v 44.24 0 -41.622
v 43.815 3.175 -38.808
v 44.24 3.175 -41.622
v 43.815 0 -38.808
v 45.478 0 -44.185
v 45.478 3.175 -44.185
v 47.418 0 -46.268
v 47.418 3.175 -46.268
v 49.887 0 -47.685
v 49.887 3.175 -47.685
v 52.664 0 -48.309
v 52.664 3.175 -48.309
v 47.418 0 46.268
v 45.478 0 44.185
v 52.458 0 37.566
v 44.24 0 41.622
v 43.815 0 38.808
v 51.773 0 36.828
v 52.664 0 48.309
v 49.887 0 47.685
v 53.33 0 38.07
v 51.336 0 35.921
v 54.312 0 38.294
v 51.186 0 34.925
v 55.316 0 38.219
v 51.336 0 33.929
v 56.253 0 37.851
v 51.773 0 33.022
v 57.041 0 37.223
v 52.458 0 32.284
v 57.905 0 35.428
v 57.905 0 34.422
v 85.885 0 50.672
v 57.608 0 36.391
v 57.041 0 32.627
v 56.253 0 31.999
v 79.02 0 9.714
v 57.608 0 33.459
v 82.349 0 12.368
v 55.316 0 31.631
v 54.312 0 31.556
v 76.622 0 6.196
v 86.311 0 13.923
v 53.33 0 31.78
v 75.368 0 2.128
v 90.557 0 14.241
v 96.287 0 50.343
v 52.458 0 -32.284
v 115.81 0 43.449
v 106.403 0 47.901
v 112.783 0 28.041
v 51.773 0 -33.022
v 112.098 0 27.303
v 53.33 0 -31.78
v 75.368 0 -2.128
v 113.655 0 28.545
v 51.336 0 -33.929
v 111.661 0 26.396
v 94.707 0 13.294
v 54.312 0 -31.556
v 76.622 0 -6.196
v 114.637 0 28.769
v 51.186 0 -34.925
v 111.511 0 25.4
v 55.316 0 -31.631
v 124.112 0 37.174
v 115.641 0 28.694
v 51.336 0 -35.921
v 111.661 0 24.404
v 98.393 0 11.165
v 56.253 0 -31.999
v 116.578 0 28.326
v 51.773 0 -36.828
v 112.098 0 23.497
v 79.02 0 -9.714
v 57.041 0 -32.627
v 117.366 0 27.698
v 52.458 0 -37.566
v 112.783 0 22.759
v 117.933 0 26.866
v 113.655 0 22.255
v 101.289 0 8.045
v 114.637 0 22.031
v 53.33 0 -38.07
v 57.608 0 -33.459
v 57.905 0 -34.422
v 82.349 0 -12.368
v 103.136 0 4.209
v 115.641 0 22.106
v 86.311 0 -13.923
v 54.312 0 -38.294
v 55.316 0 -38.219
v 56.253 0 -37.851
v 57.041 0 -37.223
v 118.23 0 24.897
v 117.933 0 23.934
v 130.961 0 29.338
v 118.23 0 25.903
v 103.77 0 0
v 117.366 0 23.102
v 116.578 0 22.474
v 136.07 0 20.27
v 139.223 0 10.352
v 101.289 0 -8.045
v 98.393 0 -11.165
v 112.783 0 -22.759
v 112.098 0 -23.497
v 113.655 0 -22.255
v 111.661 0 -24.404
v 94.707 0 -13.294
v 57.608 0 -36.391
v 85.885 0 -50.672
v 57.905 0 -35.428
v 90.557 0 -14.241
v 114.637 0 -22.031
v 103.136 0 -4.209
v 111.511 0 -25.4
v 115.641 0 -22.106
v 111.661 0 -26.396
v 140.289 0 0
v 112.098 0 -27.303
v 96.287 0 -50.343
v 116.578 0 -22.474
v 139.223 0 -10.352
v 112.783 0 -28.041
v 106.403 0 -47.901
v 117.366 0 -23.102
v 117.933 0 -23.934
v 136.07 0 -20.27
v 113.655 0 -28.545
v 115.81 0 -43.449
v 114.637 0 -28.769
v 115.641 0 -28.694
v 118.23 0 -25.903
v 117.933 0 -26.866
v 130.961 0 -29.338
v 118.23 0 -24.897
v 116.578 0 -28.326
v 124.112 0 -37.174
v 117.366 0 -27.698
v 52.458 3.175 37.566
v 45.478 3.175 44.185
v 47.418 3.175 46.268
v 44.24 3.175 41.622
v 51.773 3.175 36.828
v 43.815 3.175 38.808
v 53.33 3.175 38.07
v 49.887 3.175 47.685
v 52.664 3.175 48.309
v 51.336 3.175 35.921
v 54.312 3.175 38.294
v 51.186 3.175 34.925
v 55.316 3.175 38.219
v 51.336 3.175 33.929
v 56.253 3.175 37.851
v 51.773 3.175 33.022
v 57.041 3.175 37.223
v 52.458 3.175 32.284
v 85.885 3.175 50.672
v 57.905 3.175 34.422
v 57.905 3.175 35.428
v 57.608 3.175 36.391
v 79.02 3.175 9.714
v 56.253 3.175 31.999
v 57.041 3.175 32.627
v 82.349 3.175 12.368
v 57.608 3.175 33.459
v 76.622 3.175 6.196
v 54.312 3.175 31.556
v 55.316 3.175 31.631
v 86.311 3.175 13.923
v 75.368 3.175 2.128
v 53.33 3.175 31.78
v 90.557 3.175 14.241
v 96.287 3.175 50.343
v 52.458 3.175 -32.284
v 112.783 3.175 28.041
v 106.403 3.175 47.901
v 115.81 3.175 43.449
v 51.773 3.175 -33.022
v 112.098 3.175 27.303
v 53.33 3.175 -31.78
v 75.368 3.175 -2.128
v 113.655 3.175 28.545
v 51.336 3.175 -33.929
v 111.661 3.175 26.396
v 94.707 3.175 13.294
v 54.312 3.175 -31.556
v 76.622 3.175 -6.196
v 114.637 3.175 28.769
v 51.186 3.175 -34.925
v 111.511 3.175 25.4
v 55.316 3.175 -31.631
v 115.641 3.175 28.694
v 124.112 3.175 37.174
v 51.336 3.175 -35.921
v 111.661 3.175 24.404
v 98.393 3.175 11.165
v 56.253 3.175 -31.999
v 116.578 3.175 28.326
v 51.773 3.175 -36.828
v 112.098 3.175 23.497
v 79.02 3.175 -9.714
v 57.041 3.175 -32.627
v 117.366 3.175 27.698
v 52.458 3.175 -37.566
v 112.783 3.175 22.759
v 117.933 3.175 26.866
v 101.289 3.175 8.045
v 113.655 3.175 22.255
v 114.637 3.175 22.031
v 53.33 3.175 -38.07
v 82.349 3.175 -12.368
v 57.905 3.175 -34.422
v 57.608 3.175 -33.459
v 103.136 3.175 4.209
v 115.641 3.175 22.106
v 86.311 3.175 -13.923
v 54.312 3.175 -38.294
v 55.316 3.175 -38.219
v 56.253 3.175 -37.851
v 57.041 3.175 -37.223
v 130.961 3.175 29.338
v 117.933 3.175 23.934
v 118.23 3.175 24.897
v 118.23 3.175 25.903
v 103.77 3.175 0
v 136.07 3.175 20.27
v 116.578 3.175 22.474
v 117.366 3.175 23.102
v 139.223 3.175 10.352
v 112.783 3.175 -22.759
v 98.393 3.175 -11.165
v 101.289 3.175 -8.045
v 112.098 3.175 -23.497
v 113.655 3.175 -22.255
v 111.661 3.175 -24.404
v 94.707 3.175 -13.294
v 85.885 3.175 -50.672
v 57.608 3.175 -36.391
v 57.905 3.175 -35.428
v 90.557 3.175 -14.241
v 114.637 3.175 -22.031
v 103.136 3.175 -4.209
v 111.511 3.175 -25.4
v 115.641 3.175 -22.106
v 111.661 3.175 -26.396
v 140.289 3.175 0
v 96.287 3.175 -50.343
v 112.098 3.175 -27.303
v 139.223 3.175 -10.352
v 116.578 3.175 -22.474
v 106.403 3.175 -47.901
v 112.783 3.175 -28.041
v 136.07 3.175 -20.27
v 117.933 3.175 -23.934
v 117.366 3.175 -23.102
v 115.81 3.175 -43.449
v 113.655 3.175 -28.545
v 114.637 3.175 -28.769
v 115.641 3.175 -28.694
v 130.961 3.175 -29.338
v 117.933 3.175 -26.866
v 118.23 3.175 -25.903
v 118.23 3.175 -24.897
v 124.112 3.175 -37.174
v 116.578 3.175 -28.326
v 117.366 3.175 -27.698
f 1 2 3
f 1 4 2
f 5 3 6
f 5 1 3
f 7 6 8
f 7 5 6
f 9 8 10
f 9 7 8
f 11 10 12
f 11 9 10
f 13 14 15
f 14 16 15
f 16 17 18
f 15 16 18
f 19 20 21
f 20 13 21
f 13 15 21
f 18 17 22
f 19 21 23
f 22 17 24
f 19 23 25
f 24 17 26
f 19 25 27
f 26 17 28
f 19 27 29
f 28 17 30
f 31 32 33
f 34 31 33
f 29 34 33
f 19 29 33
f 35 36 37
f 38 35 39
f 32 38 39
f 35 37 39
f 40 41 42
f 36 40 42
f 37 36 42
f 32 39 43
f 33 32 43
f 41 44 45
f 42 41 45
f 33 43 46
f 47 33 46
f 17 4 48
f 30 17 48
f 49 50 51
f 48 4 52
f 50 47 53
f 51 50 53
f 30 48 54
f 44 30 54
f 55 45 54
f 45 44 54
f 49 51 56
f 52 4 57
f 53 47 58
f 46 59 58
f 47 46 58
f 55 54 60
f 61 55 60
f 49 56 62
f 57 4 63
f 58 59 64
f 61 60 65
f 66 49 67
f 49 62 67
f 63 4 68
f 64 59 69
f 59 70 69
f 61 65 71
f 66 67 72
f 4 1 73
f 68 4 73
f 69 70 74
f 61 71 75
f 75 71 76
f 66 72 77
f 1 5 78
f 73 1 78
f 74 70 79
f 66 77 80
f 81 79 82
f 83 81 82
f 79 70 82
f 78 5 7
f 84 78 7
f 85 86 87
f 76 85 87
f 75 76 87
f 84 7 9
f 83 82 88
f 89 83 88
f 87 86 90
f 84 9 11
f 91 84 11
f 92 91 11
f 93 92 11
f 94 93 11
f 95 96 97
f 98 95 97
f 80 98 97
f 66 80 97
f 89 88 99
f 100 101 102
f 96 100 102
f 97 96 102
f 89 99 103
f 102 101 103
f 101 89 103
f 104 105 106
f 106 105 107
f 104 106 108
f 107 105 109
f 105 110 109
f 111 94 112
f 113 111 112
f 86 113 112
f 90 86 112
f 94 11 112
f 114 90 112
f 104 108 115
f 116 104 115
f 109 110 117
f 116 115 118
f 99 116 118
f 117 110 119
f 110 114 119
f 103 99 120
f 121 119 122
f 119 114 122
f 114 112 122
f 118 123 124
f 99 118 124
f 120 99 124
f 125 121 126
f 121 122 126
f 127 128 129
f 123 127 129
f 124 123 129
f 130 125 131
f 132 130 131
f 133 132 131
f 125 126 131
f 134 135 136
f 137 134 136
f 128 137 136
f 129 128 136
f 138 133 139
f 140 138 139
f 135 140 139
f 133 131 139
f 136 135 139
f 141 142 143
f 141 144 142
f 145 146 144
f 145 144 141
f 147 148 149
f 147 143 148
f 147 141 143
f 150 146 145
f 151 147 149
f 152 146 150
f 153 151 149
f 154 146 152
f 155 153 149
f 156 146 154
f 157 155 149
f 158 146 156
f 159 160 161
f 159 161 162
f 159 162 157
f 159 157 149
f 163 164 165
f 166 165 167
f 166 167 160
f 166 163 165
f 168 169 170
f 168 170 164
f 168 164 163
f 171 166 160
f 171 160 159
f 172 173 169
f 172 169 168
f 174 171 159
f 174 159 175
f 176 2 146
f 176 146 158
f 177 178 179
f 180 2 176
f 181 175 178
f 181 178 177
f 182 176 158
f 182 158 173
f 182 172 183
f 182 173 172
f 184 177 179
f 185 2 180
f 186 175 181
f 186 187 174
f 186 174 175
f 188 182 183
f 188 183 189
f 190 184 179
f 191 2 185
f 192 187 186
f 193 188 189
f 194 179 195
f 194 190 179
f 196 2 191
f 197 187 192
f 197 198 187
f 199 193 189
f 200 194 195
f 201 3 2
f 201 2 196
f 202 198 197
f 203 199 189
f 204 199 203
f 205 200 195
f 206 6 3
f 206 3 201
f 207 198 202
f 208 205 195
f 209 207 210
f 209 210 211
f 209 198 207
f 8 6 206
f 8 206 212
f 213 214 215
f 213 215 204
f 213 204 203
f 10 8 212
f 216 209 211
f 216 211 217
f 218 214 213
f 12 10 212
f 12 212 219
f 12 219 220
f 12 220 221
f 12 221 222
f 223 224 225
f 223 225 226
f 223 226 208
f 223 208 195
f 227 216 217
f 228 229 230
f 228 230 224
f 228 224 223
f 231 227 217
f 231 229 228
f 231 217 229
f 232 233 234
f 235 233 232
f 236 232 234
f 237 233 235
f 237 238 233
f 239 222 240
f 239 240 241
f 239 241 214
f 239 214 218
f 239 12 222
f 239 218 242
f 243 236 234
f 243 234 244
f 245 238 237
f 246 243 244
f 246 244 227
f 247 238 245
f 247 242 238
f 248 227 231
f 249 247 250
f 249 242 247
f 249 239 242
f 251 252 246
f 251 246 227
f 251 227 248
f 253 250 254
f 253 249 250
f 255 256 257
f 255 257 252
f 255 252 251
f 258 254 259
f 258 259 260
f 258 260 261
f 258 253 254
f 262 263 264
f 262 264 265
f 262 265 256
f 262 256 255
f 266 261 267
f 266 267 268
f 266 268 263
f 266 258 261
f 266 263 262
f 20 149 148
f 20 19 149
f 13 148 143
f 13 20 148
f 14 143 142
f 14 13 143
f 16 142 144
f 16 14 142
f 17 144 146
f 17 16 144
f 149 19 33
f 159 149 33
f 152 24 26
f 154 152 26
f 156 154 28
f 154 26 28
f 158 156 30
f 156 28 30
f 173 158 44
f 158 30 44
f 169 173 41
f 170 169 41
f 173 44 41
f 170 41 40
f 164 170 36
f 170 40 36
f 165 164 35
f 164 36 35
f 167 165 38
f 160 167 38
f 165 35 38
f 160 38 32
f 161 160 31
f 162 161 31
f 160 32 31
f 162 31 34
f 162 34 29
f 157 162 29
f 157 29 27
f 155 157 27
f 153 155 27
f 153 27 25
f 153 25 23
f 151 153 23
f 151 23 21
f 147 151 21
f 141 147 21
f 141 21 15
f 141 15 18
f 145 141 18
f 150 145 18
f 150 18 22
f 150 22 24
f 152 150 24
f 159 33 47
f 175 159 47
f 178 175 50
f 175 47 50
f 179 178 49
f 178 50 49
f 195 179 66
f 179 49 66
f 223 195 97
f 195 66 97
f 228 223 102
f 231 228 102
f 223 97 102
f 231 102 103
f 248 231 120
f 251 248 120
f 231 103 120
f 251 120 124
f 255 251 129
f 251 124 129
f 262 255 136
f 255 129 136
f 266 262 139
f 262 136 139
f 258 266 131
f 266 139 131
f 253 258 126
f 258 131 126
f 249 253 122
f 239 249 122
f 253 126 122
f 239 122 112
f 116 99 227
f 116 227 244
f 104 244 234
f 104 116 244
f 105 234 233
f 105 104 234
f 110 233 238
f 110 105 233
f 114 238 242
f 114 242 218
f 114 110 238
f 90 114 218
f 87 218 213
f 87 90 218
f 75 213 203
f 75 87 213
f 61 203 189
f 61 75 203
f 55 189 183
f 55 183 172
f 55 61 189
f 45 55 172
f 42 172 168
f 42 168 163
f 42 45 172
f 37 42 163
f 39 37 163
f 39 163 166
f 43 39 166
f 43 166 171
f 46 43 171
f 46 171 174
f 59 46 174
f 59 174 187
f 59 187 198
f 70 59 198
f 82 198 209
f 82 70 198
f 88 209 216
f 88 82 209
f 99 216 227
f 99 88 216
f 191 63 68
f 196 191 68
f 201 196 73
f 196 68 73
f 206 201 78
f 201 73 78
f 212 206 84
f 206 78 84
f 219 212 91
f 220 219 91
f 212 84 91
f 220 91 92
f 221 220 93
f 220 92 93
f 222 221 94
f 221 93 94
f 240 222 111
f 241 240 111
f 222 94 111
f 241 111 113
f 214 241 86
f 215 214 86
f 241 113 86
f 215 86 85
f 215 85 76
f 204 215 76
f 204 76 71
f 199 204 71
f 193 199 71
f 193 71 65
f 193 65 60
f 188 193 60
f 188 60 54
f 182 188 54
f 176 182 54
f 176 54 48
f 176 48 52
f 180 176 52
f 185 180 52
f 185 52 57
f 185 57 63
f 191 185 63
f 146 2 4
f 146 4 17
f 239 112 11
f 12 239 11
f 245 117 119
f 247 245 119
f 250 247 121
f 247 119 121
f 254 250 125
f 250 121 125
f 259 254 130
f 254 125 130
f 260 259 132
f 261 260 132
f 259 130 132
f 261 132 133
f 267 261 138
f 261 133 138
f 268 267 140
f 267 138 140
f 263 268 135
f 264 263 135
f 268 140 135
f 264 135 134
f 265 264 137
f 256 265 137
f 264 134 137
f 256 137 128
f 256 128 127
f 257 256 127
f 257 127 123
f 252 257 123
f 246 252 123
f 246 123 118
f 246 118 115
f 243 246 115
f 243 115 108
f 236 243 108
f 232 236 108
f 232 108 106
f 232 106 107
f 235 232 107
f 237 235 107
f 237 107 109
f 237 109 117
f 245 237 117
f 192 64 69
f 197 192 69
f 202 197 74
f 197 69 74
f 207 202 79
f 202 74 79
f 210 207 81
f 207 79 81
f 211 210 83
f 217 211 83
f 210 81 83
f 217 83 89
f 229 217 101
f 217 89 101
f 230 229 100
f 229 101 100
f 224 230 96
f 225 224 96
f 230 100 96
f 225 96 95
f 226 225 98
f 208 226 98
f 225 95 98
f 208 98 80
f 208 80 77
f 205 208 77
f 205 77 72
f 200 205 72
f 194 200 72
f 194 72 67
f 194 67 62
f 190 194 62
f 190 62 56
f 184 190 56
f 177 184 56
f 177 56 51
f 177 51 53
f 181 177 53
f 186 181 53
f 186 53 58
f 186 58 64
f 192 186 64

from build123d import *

# Parameters (mm, degrees)
SKETCH1_R               = 14.28115
SKETCH1_R_2             = 19.177
BOSS_EXTRUDE1_DEPTH     = 3.175
F_10_CLEARANCE_HOLE1_D  = 5.1054
F_1_4_CLEARANCE_HOLE1_D = 6.7564
SKETCH6_R               = 2.5527
CUT_EXTRUDE1_DEPTH      = 4.175
FILLET1_R               = 7.62
CUT_EXTRUDE2_DEPTH      = 4.175
FILLET2_R               = 9.525


with BuildPart() as part:
    # Sketch1 → Boss-Extrude1 (new body)
    with BuildSketch(Plane(origin=(0, 0, 0), x_dir=(1, 0, 0), z_dir=(0, 1, 0))):
        with BuildLine():
            Line((85.884602434, 50.671947857), (-3.15409287, 44.337954375))
            ThreePointArc((-3.15409287, 44.337954375), (-44.45, 0), (-3.15409287, -44.337954375))
            Line((-3.15409287, -44.337954375), (85.884602434, -50.671947857))
            ThreePointArc((85.884602434, -50.671947857), (140.28928, 0), (85.884602434, 50.671947857))
        make_face()
        with Locations((89.48928, 0)):
            Circle(SKETCH1_R, mode=Mode.SUBTRACT)
        Circle(SKETCH1_R_2, mode=Mode.SUBTRACT)
    extrude(amount=BOSS_EXTRUDE1_DEPTH)

    # #10 Clearance Hole1 (through all)
    with Locations(Plane(origin=(0, 3.175, 0), x_dir=(1, 0, 0), z_dir=(0, 1, 0))):
        with Locations((-17.960512242, 17.960512242), (17.960512242, 17.960512242), (17.960512242, -17.960512242), (-17.960512242, -17.960512242), (-31.8135, 0), (34.925, 34.314713318), (34.925, -34.314713318)):
            Hole(F_10_CLEARANCE_HOLE1_D / 2)

    # 1/4 Clearance Hole1 (through all)
    with Locations(Plane(origin=(0, 3.175, 0), x_dir=(1, 0, 0), z_dir=(0, 1, 0))):
        with Locations((54.56428, 34.925), (54.56428, -34.925), (114.88928, 25.4), (114.88928, -25.4)):
            Hole(F_1_4_CLEARANCE_HOLE1_D / 2)

    # Sketch6 → Cut-Extrude1 (cut, through all)
    with BuildSketch(Plane(origin=(0, 3.175, 0), x_dir=(1, 0, 0), z_dir=(0, 1, 0))):
        with BuildLine():
            Line((-9.48365621, 16.667861107), (-14.368409794, 21.552614691))
            ThreePointArc((-14.368409794, 21.552614691), (-21.552614691, 21.552614691), (-21.552614691, 14.368409794))
            Line((-21.552614691, 14.368409794), (-16.667861107, 9.48365621))
            ThreePointArc((-16.667861107, 9.48365621), (-13.560186743, 13.560186743), (-9.48365621, 16.667861107))
        make_face()
        with Locations((-17.960512242, 17.960512242)):
            Circle(SKETCH6_R, mode=Mode.SUBTRACT)
        with BuildLine():
            ThreePointArc((16.667861107, -9.48365621), (13.560186743, -13.560186743), (9.48365621, -16.667861107))
            Line((9.48365621, -16.667861107), (14.368409794, -21.552614691))
            ThreePointArc((14.368409794, -21.552614691), (21.552614691, -21.552614691), (21.552614691, -14.368409794))
            Line((21.552614691, -14.368409794), (16.667861107, -9.48365621))
        make_face()
        with Locations((17.960512242, -17.960512242)):
            Circle(SKETCH6_R, mode=Mode.SUBTRACT)
    extrude(amount=-CUT_EXTRUDE1_DEPTH, mode=Mode.SUBTRACT)

    # Fillet1
    fillet1_edges = [part.edges().sort_by_distance(p)[0] for p in [
        (9.48365621, 1.5875, 16.667861107),
        (16.667861107, 1.5875, 9.48365621),
        (-9.48365621, 1.5875, -16.667861107),
        (-16.667861107, 1.5875, -9.48365621),
    ]]
    fillet(fillet1_edges, radius=FILLET1_R)

    # Sketch7 → Cut-Extrude2 (cut, through all)
    with BuildSketch(Plane(origin=(0, 3.175, 0), x_dir=(1, 0, 0), z_dir=(0, 1, 0))):
        Polygon((43.815, 47.679219957), (43.815, -47.679219957), (-626.42496, 0), align=None)
    extrude(amount=-CUT_EXTRUDE2_DEPTH, mode=Mode.SUBTRACT)

    # Fillet2
    fillet2_edges = [part.edges().sort_by_distance(p)[0] for p in [
        (43.815, 1.5875, 47.679219957),
        (43.815, 1.5875, -47.679219957),
    ]]
    fillet(fillet2_edges, radius=FILLET2_R)


solid = part.part
